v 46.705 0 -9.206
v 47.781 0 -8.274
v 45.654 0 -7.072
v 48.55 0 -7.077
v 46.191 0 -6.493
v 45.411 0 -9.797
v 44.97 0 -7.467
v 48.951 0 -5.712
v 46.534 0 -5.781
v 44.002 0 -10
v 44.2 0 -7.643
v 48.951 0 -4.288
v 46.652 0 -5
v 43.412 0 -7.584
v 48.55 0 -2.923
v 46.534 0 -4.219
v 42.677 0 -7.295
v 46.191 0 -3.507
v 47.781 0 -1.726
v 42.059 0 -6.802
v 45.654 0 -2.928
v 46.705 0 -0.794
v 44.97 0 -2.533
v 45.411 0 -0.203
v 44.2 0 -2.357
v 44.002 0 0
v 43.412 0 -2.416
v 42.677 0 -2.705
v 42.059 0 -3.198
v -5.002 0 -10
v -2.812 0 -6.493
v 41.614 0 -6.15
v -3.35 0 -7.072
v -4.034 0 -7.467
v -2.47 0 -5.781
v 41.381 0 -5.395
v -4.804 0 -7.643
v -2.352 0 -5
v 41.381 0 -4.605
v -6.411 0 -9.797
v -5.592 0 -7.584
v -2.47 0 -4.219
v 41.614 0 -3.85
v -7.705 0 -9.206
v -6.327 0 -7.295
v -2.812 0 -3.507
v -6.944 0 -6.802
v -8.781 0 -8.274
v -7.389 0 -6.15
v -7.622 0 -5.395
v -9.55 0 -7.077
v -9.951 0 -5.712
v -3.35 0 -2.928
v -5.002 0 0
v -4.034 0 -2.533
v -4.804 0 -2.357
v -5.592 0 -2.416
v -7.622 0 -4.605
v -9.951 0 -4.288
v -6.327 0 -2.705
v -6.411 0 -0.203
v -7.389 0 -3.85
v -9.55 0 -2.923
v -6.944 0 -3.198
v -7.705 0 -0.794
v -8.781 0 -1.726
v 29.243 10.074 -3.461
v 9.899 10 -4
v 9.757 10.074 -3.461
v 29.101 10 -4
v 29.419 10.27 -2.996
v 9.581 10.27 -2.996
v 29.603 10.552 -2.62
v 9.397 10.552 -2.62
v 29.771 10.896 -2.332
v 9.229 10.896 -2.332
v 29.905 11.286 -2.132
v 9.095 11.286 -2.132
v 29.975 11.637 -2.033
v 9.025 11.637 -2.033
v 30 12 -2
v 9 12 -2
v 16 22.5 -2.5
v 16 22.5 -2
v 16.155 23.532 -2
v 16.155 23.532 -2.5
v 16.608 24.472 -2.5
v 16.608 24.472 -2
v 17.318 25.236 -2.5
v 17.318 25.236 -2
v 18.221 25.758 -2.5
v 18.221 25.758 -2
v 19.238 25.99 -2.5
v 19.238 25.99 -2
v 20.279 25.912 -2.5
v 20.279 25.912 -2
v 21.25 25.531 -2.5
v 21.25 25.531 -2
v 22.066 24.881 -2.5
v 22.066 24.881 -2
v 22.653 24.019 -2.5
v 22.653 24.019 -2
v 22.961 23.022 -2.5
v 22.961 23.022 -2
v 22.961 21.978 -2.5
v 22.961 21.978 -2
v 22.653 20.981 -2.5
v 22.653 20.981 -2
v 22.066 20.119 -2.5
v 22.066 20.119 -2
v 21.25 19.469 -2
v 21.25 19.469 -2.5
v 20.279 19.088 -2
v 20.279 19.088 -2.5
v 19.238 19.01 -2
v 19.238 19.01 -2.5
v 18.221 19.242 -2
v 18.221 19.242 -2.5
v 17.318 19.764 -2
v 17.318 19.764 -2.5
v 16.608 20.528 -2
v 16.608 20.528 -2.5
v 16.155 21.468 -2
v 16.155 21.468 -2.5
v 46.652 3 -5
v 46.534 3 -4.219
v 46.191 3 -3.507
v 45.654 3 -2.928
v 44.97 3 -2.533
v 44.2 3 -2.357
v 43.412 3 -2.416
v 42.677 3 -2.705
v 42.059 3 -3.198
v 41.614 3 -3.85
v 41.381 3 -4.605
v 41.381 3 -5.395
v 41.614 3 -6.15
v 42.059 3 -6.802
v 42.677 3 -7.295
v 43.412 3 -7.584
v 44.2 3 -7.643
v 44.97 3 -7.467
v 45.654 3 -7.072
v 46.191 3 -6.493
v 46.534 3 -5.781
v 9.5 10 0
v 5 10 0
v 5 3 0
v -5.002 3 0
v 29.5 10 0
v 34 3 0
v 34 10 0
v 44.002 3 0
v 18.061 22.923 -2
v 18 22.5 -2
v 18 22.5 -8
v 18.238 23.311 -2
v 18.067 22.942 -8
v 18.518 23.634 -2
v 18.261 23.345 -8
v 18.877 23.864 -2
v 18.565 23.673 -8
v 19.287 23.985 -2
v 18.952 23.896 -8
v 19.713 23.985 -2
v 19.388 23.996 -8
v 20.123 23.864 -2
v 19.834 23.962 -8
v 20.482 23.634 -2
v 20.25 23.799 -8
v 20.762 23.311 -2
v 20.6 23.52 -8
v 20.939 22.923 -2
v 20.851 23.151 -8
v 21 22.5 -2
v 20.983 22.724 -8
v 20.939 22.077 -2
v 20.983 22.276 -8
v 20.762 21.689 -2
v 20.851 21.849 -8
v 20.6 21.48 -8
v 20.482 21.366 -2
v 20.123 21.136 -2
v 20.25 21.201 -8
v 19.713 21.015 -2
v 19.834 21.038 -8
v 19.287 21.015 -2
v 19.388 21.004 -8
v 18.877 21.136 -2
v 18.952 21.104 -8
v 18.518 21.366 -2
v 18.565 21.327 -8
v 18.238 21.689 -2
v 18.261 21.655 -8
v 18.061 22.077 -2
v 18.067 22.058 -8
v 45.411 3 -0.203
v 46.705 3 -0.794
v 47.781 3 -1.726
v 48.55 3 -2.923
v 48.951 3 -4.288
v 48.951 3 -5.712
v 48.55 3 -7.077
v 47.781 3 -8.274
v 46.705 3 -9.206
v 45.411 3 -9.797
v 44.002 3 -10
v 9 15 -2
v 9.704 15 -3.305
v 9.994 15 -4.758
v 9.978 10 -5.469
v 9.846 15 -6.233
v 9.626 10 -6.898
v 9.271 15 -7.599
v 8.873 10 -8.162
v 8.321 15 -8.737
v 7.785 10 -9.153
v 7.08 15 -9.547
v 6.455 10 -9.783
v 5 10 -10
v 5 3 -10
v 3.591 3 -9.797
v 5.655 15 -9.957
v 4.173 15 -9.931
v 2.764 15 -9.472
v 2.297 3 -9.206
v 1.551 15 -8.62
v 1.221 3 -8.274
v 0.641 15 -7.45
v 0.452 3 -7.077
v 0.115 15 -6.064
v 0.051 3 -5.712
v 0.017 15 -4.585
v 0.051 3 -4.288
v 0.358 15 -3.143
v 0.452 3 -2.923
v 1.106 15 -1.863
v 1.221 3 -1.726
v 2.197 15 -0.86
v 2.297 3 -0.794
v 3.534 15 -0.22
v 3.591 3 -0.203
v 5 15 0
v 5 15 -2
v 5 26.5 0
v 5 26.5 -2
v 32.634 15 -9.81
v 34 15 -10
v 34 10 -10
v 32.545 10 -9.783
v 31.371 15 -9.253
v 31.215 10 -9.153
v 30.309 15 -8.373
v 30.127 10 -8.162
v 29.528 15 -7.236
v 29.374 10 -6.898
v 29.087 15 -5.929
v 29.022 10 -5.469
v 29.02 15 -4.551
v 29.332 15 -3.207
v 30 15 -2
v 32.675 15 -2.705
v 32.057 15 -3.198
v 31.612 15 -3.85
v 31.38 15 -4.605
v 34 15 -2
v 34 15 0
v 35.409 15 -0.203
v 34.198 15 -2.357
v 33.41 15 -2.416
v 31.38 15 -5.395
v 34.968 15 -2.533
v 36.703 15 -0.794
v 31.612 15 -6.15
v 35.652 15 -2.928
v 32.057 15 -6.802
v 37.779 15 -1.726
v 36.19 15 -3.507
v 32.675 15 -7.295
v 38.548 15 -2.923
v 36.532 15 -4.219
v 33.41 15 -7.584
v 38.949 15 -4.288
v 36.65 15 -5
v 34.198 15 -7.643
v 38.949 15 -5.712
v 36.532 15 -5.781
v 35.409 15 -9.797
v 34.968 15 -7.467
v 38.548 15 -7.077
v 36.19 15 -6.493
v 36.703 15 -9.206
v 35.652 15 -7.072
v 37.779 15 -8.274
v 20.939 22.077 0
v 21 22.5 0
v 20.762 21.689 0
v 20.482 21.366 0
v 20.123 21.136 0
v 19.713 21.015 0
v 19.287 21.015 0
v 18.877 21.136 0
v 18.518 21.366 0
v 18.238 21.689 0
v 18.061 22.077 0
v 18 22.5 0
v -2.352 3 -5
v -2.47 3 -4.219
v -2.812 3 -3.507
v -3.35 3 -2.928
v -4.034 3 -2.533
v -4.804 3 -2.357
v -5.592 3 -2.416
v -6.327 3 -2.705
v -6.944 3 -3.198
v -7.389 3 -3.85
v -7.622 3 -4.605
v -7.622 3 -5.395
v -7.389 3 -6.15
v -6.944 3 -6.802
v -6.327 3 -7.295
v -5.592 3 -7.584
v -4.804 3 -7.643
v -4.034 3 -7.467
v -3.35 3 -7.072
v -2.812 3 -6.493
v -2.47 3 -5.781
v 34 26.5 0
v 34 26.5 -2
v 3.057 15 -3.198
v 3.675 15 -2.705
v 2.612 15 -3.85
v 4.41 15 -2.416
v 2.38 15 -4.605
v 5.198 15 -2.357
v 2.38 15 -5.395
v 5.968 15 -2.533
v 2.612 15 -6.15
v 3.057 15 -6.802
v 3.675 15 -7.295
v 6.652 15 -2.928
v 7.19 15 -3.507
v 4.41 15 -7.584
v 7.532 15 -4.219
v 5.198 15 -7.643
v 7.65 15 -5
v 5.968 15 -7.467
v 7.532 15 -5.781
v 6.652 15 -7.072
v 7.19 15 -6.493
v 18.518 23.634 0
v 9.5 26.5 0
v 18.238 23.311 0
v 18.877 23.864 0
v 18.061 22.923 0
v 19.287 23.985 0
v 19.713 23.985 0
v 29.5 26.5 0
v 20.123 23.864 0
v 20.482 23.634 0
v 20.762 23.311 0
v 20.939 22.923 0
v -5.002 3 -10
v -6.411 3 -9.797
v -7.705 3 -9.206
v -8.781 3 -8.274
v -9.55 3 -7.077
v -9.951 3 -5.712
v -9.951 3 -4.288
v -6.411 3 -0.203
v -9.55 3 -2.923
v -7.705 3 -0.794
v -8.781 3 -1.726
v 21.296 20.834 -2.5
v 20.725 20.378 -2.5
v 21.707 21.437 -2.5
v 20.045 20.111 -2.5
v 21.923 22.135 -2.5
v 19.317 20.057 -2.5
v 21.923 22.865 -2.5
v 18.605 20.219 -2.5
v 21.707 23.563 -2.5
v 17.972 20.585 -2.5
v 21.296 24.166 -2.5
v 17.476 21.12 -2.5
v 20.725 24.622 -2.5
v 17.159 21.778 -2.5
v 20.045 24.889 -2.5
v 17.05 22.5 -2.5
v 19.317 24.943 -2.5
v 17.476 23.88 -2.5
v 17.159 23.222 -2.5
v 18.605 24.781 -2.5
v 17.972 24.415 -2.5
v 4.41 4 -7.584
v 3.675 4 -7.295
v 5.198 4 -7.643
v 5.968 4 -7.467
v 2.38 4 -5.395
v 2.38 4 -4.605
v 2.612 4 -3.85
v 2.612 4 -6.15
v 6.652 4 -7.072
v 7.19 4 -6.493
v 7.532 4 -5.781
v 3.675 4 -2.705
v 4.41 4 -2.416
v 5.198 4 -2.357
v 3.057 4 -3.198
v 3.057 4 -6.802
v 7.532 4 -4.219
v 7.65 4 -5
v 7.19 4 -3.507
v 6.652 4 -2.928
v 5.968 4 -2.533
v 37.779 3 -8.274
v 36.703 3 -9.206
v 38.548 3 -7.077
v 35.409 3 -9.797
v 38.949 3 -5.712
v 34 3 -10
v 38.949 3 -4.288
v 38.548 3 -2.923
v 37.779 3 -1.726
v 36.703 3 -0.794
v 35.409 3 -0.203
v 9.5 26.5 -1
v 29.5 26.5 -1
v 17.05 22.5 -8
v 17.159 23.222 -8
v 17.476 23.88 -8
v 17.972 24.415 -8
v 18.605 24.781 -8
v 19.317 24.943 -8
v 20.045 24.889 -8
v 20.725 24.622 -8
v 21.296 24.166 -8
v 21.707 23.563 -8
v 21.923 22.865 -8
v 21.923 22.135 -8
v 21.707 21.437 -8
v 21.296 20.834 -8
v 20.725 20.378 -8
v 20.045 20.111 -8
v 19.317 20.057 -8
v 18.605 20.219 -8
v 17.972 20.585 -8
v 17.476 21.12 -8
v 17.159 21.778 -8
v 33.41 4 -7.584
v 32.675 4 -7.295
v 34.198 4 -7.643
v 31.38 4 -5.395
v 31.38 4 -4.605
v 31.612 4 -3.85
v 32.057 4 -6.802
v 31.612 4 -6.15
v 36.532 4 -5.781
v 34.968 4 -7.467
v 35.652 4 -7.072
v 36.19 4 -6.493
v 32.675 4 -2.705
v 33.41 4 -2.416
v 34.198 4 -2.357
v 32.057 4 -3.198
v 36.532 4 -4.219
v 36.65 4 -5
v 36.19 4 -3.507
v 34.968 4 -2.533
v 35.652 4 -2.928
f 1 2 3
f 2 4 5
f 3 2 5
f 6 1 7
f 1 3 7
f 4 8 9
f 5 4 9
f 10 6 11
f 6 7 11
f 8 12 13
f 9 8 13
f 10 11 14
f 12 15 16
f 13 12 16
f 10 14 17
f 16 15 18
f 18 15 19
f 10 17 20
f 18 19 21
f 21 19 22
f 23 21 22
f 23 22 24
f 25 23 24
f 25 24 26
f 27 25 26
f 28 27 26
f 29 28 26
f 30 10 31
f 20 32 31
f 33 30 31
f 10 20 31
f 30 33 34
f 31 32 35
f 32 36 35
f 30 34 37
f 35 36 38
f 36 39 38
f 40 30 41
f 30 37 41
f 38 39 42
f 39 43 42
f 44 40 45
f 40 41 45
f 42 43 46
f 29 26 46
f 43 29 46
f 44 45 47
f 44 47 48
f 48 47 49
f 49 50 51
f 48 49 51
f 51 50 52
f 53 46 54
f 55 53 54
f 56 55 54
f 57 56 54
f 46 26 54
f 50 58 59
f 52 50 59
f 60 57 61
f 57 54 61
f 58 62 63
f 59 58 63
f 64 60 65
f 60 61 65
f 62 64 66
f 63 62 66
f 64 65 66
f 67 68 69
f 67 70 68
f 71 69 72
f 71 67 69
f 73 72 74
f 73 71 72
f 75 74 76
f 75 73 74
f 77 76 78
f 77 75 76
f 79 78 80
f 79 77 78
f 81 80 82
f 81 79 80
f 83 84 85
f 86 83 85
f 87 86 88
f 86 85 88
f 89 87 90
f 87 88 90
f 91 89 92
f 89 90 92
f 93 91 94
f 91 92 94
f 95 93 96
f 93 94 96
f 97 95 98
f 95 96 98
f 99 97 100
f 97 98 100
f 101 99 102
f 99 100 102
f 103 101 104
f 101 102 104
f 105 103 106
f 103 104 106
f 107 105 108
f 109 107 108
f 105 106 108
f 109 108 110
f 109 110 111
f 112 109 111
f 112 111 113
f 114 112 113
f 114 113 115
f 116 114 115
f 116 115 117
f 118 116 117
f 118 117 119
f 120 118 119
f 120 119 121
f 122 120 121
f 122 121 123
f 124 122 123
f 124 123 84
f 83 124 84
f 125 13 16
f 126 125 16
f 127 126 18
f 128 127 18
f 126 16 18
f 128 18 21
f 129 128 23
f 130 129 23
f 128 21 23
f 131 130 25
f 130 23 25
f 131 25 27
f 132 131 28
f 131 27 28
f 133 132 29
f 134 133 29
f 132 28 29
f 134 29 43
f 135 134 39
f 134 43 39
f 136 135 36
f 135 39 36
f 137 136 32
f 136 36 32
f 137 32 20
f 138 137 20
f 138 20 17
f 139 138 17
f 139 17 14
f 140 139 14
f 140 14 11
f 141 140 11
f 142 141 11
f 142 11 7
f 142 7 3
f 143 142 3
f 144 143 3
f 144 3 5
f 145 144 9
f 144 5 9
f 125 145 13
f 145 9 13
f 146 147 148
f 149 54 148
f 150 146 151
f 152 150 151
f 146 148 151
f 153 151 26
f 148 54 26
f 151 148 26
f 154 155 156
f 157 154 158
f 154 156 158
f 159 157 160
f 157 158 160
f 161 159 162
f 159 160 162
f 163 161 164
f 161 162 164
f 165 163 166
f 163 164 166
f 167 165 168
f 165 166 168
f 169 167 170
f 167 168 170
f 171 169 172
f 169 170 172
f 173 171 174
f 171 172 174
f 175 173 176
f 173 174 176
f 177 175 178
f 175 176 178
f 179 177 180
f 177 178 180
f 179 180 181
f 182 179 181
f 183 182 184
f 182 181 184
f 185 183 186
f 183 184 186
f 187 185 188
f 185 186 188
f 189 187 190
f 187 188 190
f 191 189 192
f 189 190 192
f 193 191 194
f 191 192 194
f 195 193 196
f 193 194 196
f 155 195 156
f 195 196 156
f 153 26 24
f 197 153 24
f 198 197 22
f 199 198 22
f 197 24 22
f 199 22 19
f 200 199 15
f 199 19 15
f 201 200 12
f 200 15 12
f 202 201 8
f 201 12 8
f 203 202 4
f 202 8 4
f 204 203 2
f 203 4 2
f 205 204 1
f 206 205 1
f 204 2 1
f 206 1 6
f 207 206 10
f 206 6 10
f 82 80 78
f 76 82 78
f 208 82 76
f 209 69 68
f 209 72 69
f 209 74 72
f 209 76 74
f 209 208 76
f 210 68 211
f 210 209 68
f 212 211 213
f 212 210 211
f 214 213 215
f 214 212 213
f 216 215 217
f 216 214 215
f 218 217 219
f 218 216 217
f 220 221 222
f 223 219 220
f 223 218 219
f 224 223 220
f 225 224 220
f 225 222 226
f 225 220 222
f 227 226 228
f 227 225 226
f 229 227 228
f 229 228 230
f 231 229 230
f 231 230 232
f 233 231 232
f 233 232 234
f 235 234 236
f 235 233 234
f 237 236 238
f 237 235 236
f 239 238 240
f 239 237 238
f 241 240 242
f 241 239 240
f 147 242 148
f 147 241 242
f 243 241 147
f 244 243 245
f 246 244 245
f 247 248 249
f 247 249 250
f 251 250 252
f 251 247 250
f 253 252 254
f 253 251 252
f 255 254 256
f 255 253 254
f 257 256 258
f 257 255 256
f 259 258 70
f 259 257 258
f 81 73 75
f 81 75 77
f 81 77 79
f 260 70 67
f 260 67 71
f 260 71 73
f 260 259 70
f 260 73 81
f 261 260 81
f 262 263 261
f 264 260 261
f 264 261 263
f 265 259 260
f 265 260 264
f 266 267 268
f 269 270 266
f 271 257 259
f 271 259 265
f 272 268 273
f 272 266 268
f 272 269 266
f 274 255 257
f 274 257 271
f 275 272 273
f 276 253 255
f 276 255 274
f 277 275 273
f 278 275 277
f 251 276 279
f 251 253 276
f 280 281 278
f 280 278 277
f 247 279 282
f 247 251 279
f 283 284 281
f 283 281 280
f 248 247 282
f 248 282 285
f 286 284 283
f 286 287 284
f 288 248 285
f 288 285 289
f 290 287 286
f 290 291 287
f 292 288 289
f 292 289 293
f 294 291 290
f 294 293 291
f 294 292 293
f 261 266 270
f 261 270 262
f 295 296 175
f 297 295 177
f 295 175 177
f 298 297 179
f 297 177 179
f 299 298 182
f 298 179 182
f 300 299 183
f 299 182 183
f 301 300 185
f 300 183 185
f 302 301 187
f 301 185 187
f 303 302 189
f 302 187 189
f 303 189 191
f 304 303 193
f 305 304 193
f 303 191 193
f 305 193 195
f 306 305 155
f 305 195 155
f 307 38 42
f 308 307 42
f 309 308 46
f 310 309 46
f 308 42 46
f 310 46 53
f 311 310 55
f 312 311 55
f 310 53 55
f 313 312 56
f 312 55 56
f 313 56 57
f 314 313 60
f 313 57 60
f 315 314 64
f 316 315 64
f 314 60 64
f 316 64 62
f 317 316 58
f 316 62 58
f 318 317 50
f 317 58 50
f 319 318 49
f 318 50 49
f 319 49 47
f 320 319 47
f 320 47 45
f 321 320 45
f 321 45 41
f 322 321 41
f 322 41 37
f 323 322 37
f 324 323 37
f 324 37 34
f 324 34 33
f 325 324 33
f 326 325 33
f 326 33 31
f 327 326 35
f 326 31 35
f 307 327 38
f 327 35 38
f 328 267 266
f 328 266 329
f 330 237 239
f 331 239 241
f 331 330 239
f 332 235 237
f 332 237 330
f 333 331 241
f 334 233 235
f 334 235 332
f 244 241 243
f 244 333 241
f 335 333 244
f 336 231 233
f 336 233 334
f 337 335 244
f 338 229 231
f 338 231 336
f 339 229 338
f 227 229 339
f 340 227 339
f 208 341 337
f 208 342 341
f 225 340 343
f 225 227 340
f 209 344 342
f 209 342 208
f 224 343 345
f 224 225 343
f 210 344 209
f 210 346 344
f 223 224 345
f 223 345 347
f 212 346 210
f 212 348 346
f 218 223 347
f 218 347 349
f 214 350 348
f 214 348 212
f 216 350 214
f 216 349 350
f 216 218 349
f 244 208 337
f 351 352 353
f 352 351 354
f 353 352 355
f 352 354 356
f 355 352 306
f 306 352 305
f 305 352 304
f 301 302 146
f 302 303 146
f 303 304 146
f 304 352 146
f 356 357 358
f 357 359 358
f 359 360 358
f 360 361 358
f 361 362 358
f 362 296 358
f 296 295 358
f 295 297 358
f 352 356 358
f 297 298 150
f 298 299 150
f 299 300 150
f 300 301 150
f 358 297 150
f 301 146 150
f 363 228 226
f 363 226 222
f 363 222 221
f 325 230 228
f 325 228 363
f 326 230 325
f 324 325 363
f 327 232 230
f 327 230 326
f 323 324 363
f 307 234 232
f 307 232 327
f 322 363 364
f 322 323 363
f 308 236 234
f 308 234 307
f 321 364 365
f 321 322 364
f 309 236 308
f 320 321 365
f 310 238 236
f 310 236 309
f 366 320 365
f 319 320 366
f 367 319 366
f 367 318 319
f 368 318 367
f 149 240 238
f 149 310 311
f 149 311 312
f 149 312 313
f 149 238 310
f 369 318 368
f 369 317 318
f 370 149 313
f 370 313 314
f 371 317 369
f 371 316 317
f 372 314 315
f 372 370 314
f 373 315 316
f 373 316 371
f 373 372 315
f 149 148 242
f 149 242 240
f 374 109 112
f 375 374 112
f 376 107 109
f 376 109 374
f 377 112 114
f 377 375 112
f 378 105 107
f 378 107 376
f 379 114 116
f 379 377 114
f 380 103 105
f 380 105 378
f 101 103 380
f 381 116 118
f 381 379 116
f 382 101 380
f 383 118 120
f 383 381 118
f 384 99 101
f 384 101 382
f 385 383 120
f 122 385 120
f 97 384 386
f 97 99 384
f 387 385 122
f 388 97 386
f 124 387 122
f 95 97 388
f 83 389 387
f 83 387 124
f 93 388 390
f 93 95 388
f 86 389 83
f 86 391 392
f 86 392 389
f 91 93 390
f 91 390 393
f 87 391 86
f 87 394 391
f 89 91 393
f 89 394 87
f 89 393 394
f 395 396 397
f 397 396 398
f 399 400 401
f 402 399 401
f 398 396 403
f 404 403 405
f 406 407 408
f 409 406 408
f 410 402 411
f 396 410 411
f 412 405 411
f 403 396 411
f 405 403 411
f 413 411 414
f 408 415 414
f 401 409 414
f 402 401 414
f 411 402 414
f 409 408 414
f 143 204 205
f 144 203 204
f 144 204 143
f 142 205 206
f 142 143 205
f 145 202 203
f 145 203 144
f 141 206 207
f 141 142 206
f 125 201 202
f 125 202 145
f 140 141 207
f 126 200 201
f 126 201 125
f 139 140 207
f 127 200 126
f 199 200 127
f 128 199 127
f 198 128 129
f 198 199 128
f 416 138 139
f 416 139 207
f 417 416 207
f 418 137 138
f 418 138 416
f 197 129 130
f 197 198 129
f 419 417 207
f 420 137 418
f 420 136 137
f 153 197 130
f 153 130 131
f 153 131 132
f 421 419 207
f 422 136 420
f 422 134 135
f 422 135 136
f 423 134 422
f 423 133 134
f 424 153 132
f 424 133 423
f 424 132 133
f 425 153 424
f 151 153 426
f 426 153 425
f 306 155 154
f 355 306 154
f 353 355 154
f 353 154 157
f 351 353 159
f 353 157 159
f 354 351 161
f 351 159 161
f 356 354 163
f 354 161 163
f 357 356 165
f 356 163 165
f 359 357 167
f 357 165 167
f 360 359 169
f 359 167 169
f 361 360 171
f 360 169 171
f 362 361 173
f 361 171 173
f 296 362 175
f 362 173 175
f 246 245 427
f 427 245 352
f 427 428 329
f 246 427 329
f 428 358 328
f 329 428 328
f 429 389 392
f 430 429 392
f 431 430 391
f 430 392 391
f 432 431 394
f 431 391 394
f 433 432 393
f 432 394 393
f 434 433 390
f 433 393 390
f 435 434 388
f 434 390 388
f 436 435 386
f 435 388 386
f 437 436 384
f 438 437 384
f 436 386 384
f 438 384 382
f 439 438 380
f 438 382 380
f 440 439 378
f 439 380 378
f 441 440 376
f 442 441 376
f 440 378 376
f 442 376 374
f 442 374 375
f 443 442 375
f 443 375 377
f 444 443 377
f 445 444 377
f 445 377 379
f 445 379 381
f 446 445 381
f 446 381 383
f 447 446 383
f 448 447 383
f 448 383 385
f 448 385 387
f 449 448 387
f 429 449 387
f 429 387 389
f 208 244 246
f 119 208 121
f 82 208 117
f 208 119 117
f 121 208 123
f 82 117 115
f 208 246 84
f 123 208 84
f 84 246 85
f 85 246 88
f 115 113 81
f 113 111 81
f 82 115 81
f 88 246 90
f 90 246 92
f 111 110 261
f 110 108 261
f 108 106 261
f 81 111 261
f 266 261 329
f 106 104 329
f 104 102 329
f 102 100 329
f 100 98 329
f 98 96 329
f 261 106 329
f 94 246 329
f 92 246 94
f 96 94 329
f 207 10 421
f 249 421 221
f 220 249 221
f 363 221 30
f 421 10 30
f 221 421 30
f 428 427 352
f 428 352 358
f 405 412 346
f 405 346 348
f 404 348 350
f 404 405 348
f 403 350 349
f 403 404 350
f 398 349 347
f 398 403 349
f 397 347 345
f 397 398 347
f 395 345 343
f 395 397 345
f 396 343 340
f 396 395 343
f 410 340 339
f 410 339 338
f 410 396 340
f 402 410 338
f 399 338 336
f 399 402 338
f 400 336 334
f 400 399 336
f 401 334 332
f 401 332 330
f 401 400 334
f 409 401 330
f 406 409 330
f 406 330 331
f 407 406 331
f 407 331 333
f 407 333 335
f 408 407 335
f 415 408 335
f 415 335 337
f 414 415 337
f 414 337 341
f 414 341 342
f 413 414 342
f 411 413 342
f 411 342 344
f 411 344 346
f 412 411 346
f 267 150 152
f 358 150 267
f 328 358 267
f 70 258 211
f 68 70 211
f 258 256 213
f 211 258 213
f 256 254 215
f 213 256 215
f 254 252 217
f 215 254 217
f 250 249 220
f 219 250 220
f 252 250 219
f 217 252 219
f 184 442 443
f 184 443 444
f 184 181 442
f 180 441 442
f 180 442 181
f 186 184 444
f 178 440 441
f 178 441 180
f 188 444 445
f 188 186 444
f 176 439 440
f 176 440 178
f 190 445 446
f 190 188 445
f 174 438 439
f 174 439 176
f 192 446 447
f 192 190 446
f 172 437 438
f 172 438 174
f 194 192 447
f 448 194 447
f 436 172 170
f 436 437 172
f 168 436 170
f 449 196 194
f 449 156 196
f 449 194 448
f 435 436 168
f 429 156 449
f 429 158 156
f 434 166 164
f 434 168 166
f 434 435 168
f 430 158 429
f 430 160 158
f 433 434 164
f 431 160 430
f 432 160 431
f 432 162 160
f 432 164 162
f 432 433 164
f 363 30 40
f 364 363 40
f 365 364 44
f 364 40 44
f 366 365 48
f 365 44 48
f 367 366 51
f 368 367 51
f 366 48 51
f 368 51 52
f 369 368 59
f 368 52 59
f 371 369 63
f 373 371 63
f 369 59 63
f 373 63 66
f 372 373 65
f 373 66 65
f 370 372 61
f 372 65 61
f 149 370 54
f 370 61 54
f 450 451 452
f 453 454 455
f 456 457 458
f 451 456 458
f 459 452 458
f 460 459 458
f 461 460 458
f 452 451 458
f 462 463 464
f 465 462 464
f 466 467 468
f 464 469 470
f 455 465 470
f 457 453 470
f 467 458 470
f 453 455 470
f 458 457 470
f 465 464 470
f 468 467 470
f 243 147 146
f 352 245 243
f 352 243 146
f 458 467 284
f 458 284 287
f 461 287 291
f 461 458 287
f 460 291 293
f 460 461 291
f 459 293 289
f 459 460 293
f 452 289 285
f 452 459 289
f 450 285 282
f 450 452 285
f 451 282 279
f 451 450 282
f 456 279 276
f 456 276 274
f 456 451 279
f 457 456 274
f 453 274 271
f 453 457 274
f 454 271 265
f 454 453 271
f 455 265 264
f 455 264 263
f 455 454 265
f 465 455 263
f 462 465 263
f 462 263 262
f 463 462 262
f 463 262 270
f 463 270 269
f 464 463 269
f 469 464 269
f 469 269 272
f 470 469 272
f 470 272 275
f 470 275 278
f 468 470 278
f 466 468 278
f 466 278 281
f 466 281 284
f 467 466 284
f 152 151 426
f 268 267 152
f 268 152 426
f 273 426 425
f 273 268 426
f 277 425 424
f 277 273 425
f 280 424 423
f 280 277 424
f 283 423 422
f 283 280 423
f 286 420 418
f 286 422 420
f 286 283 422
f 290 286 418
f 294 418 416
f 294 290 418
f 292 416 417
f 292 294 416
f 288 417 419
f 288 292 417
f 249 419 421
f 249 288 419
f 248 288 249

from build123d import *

# Parameters (mm, degrees)
ESQUISSE1_R             = 2.65
BOSS_EXTRU_1_DEPTH      = 15
ESQUISSE2_R             = 3.488871883
ESQUISSE2_R_2           = 3.573781448
BOSS_EXTRU_2_DEPTH      = 4
ENL_V_MAT_EXTRU_1_DEPTH = 5
ESQUISSE8_R             = 2.65
BOSS_EXTRU_3_DEPTH      = 3
ESQUISSE10_W            = 20
ESQUISSE10_H            = 1
BOSS_EXTRU_4_DEPTH      = 12.5
ESQUISSE11_R            = 2.45
ESQUISSE11_R_2          = 1.5
BOSS_EXTRU_5_DEPTH      = 7
ESQUISSE12_W            = 20
ESQUISSE12_H            = 1
BOSS_EXTRU_6_DEPTH      = 4
ESQUISSE13_R            = 3.5
BOSS_EXTRU_7_DEPTH      = 1.5
ESQUISSE14_R            = 1.5
ENL_V_MAT_EXTRU_2_DEPTH = 9
ESQUISSE15_W            = 29
ESQUISSE15_H            = 16.5
ESQUISSE15_R            = 1.5
BOSS_EXTRU_8_DEPTH      = 2
CONG_1_R                = 2


with BuildPart() as part:
    # Esquisse1 → Boss.-Extru.1 (new body)
    with BuildSketch(Plane(origin=(0, 0, 0), x_dir=(1, 0, 0), z_dir=(0, 1, 0))):
        with BuildLine():
            Line((5, 0), (34, 0))
            ThreePointArc((34, 0), (39, 5), (34, 10))
            Line((34, 10), (5, 10))
            ThreePointArc((5, 10), (0, 5), (5, 0))
        make_face()
        with Locations((5, 5)):
            Circle(ESQUISSE1_R, mode=Mode.SUBTRACT)
        with Locations((34, 5)):
            Circle(ESQUISSE1_R, mode=Mode.SUBTRACT)
    extrude(amount=BOSS_EXTRU_1_DEPTH)

    # Esquisse2 → Boss.-Extru.2 (add)
    with BuildSketch(Plane.XZ):
        with Locations((5, -5)):
            Circle(ESQUISSE2_R)
        with Locations((34, -5)):
            Circle(ESQUISSE2_R_2)
    extrude(amount=-BOSS_EXTRU_2_DEPTH)

    # Esquisse3 → Enlèv. mat.-Extru.1 (cut)
    with BuildSketch(Plane(origin=(0, 15, 0), x_dir=(1, 0, 0), z_dir=(0, 1, 0))):
        with BuildLine():
            Line((5, 10), (34, 10))
            ThreePointArc((34, 10), (29, 5), (34, 0))
            Line((34, 0), (5, 0))
            ThreePointArc((5, 0), (10, 5), (5, 10))
        make_face()
    extrude(amount=-ENL_V_MAT_EXTRU_1_DEPTH, mode=Mode.SUBTRACT)

    # Esquisse8 → Boss.-Extru.3 (add)
    with BuildSketch(Plane.XZ):
        with BuildLine():
            Line((44.001861421, -10), (-5.001861421, -10))
            ThreePointArc((-5.001861421, -10), (-10.001861421, -5), (-5.001861421, 0))
            Line((-5.001861421, 0), (44.001861421, 0))
            ThreePointArc((44.001861421, 0), (49.001861421, -5), (44.001861421, -10))
        make_face()
        with Locations((-5.001861421, -5)):
            Circle(ESQUISSE8_R, mode=Mode.SUBTRACT)
        with Locations((44.001861421, -5)):
            Circle(ESQUISSE8_R, mode=Mode.SUBTRACT)
    extrude(amount=-BOSS_EXTRU_3_DEPTH)

    # Esquisse10 → Boss.-Extru.4 (add)
    with BuildSketch(Plane(origin=(0, 10, 0), x_dir=(1, 0, 0), z_dir=(0, 1, 0))):
        with Locations((19.5, 0.5)):
            Rectangle(ESQUISSE10_W, ESQUISSE10_H)
    extrude(amount=BOSS_EXTRU_4_DEPTH)

    # Esquisse11 → Boss.-Extru.5 (add)
    with BuildSketch(Plane(origin=(0, 0, -1), x_dir=(-1, 0, 0), z_dir=(0, 0, -1))):
        with Locations((-19.5, 22.5)):
            Circle(ESQUISSE11_R)
        with Locations((-19.5, 22.5)):
            Circle(ESQUISSE11_R_2, mode=Mode.SUBTRACT)
    extrude(amount=BOSS_EXTRU_5_DEPTH)

    # Esquisse12 → Boss.-Extru.6 (add)
    with BuildSketch(Plane(origin=(0, 22.5, 0), x_dir=(1, 0, 0), z_dir=(0, 1, 0))):
        with Locations((19.5, 0.5)):
            Rectangle(ESQUISSE12_W, ESQUISSE12_H)
    extrude(amount=BOSS_EXTRU_6_DEPTH)

    # Esquisse13 → Boss.-Extru.7 (add)
    with BuildSketch(Plane(origin=(0, 0, -1), x_dir=(-1, 0, 0), z_dir=(0, 0, -1))):
        with Locations((-19.5, 22.5)):
            Circle(ESQUISSE13_R)
    extrude(amount=BOSS_EXTRU_7_DEPTH)

    # Esquisse14 → Enlèv. mat.-Extru.2 (cut, through all)
    with BuildSketch(Plane(origin=(0, 0, -8), x_dir=(-1, 0, 0), z_dir=(0, 0, -1))):
        with Locations((-19.5, 22.5)):
            Circle(ESQUISSE14_R)
    extrude(amount=-ENL_V_MAT_EXTRU_2_DEPTH, mode=Mode.SUBTRACT)

    # Esquisse15 → Boss.-Extru.8 (add)
    with BuildSketch(Plane.XY):
        with Locations((19.5, 18.25)):
            Rectangle(ESQUISSE15_W, ESQUISSE15_H)
        with Locations((19.5, 22.5)):
            Circle(ESQUISSE15_R, mode=Mode.SUBTRACT)
    extrude(amount=-BOSS_EXTRU_8_DEPTH)

    # Congé1
    cong_1_edges = [part.edges().sort_by_distance(p)[0] for p in [
        (19.5, 10, -2),
    ]]
    fillet(cong_1_edges, radius=CONG_1_R)


solid = part.part
